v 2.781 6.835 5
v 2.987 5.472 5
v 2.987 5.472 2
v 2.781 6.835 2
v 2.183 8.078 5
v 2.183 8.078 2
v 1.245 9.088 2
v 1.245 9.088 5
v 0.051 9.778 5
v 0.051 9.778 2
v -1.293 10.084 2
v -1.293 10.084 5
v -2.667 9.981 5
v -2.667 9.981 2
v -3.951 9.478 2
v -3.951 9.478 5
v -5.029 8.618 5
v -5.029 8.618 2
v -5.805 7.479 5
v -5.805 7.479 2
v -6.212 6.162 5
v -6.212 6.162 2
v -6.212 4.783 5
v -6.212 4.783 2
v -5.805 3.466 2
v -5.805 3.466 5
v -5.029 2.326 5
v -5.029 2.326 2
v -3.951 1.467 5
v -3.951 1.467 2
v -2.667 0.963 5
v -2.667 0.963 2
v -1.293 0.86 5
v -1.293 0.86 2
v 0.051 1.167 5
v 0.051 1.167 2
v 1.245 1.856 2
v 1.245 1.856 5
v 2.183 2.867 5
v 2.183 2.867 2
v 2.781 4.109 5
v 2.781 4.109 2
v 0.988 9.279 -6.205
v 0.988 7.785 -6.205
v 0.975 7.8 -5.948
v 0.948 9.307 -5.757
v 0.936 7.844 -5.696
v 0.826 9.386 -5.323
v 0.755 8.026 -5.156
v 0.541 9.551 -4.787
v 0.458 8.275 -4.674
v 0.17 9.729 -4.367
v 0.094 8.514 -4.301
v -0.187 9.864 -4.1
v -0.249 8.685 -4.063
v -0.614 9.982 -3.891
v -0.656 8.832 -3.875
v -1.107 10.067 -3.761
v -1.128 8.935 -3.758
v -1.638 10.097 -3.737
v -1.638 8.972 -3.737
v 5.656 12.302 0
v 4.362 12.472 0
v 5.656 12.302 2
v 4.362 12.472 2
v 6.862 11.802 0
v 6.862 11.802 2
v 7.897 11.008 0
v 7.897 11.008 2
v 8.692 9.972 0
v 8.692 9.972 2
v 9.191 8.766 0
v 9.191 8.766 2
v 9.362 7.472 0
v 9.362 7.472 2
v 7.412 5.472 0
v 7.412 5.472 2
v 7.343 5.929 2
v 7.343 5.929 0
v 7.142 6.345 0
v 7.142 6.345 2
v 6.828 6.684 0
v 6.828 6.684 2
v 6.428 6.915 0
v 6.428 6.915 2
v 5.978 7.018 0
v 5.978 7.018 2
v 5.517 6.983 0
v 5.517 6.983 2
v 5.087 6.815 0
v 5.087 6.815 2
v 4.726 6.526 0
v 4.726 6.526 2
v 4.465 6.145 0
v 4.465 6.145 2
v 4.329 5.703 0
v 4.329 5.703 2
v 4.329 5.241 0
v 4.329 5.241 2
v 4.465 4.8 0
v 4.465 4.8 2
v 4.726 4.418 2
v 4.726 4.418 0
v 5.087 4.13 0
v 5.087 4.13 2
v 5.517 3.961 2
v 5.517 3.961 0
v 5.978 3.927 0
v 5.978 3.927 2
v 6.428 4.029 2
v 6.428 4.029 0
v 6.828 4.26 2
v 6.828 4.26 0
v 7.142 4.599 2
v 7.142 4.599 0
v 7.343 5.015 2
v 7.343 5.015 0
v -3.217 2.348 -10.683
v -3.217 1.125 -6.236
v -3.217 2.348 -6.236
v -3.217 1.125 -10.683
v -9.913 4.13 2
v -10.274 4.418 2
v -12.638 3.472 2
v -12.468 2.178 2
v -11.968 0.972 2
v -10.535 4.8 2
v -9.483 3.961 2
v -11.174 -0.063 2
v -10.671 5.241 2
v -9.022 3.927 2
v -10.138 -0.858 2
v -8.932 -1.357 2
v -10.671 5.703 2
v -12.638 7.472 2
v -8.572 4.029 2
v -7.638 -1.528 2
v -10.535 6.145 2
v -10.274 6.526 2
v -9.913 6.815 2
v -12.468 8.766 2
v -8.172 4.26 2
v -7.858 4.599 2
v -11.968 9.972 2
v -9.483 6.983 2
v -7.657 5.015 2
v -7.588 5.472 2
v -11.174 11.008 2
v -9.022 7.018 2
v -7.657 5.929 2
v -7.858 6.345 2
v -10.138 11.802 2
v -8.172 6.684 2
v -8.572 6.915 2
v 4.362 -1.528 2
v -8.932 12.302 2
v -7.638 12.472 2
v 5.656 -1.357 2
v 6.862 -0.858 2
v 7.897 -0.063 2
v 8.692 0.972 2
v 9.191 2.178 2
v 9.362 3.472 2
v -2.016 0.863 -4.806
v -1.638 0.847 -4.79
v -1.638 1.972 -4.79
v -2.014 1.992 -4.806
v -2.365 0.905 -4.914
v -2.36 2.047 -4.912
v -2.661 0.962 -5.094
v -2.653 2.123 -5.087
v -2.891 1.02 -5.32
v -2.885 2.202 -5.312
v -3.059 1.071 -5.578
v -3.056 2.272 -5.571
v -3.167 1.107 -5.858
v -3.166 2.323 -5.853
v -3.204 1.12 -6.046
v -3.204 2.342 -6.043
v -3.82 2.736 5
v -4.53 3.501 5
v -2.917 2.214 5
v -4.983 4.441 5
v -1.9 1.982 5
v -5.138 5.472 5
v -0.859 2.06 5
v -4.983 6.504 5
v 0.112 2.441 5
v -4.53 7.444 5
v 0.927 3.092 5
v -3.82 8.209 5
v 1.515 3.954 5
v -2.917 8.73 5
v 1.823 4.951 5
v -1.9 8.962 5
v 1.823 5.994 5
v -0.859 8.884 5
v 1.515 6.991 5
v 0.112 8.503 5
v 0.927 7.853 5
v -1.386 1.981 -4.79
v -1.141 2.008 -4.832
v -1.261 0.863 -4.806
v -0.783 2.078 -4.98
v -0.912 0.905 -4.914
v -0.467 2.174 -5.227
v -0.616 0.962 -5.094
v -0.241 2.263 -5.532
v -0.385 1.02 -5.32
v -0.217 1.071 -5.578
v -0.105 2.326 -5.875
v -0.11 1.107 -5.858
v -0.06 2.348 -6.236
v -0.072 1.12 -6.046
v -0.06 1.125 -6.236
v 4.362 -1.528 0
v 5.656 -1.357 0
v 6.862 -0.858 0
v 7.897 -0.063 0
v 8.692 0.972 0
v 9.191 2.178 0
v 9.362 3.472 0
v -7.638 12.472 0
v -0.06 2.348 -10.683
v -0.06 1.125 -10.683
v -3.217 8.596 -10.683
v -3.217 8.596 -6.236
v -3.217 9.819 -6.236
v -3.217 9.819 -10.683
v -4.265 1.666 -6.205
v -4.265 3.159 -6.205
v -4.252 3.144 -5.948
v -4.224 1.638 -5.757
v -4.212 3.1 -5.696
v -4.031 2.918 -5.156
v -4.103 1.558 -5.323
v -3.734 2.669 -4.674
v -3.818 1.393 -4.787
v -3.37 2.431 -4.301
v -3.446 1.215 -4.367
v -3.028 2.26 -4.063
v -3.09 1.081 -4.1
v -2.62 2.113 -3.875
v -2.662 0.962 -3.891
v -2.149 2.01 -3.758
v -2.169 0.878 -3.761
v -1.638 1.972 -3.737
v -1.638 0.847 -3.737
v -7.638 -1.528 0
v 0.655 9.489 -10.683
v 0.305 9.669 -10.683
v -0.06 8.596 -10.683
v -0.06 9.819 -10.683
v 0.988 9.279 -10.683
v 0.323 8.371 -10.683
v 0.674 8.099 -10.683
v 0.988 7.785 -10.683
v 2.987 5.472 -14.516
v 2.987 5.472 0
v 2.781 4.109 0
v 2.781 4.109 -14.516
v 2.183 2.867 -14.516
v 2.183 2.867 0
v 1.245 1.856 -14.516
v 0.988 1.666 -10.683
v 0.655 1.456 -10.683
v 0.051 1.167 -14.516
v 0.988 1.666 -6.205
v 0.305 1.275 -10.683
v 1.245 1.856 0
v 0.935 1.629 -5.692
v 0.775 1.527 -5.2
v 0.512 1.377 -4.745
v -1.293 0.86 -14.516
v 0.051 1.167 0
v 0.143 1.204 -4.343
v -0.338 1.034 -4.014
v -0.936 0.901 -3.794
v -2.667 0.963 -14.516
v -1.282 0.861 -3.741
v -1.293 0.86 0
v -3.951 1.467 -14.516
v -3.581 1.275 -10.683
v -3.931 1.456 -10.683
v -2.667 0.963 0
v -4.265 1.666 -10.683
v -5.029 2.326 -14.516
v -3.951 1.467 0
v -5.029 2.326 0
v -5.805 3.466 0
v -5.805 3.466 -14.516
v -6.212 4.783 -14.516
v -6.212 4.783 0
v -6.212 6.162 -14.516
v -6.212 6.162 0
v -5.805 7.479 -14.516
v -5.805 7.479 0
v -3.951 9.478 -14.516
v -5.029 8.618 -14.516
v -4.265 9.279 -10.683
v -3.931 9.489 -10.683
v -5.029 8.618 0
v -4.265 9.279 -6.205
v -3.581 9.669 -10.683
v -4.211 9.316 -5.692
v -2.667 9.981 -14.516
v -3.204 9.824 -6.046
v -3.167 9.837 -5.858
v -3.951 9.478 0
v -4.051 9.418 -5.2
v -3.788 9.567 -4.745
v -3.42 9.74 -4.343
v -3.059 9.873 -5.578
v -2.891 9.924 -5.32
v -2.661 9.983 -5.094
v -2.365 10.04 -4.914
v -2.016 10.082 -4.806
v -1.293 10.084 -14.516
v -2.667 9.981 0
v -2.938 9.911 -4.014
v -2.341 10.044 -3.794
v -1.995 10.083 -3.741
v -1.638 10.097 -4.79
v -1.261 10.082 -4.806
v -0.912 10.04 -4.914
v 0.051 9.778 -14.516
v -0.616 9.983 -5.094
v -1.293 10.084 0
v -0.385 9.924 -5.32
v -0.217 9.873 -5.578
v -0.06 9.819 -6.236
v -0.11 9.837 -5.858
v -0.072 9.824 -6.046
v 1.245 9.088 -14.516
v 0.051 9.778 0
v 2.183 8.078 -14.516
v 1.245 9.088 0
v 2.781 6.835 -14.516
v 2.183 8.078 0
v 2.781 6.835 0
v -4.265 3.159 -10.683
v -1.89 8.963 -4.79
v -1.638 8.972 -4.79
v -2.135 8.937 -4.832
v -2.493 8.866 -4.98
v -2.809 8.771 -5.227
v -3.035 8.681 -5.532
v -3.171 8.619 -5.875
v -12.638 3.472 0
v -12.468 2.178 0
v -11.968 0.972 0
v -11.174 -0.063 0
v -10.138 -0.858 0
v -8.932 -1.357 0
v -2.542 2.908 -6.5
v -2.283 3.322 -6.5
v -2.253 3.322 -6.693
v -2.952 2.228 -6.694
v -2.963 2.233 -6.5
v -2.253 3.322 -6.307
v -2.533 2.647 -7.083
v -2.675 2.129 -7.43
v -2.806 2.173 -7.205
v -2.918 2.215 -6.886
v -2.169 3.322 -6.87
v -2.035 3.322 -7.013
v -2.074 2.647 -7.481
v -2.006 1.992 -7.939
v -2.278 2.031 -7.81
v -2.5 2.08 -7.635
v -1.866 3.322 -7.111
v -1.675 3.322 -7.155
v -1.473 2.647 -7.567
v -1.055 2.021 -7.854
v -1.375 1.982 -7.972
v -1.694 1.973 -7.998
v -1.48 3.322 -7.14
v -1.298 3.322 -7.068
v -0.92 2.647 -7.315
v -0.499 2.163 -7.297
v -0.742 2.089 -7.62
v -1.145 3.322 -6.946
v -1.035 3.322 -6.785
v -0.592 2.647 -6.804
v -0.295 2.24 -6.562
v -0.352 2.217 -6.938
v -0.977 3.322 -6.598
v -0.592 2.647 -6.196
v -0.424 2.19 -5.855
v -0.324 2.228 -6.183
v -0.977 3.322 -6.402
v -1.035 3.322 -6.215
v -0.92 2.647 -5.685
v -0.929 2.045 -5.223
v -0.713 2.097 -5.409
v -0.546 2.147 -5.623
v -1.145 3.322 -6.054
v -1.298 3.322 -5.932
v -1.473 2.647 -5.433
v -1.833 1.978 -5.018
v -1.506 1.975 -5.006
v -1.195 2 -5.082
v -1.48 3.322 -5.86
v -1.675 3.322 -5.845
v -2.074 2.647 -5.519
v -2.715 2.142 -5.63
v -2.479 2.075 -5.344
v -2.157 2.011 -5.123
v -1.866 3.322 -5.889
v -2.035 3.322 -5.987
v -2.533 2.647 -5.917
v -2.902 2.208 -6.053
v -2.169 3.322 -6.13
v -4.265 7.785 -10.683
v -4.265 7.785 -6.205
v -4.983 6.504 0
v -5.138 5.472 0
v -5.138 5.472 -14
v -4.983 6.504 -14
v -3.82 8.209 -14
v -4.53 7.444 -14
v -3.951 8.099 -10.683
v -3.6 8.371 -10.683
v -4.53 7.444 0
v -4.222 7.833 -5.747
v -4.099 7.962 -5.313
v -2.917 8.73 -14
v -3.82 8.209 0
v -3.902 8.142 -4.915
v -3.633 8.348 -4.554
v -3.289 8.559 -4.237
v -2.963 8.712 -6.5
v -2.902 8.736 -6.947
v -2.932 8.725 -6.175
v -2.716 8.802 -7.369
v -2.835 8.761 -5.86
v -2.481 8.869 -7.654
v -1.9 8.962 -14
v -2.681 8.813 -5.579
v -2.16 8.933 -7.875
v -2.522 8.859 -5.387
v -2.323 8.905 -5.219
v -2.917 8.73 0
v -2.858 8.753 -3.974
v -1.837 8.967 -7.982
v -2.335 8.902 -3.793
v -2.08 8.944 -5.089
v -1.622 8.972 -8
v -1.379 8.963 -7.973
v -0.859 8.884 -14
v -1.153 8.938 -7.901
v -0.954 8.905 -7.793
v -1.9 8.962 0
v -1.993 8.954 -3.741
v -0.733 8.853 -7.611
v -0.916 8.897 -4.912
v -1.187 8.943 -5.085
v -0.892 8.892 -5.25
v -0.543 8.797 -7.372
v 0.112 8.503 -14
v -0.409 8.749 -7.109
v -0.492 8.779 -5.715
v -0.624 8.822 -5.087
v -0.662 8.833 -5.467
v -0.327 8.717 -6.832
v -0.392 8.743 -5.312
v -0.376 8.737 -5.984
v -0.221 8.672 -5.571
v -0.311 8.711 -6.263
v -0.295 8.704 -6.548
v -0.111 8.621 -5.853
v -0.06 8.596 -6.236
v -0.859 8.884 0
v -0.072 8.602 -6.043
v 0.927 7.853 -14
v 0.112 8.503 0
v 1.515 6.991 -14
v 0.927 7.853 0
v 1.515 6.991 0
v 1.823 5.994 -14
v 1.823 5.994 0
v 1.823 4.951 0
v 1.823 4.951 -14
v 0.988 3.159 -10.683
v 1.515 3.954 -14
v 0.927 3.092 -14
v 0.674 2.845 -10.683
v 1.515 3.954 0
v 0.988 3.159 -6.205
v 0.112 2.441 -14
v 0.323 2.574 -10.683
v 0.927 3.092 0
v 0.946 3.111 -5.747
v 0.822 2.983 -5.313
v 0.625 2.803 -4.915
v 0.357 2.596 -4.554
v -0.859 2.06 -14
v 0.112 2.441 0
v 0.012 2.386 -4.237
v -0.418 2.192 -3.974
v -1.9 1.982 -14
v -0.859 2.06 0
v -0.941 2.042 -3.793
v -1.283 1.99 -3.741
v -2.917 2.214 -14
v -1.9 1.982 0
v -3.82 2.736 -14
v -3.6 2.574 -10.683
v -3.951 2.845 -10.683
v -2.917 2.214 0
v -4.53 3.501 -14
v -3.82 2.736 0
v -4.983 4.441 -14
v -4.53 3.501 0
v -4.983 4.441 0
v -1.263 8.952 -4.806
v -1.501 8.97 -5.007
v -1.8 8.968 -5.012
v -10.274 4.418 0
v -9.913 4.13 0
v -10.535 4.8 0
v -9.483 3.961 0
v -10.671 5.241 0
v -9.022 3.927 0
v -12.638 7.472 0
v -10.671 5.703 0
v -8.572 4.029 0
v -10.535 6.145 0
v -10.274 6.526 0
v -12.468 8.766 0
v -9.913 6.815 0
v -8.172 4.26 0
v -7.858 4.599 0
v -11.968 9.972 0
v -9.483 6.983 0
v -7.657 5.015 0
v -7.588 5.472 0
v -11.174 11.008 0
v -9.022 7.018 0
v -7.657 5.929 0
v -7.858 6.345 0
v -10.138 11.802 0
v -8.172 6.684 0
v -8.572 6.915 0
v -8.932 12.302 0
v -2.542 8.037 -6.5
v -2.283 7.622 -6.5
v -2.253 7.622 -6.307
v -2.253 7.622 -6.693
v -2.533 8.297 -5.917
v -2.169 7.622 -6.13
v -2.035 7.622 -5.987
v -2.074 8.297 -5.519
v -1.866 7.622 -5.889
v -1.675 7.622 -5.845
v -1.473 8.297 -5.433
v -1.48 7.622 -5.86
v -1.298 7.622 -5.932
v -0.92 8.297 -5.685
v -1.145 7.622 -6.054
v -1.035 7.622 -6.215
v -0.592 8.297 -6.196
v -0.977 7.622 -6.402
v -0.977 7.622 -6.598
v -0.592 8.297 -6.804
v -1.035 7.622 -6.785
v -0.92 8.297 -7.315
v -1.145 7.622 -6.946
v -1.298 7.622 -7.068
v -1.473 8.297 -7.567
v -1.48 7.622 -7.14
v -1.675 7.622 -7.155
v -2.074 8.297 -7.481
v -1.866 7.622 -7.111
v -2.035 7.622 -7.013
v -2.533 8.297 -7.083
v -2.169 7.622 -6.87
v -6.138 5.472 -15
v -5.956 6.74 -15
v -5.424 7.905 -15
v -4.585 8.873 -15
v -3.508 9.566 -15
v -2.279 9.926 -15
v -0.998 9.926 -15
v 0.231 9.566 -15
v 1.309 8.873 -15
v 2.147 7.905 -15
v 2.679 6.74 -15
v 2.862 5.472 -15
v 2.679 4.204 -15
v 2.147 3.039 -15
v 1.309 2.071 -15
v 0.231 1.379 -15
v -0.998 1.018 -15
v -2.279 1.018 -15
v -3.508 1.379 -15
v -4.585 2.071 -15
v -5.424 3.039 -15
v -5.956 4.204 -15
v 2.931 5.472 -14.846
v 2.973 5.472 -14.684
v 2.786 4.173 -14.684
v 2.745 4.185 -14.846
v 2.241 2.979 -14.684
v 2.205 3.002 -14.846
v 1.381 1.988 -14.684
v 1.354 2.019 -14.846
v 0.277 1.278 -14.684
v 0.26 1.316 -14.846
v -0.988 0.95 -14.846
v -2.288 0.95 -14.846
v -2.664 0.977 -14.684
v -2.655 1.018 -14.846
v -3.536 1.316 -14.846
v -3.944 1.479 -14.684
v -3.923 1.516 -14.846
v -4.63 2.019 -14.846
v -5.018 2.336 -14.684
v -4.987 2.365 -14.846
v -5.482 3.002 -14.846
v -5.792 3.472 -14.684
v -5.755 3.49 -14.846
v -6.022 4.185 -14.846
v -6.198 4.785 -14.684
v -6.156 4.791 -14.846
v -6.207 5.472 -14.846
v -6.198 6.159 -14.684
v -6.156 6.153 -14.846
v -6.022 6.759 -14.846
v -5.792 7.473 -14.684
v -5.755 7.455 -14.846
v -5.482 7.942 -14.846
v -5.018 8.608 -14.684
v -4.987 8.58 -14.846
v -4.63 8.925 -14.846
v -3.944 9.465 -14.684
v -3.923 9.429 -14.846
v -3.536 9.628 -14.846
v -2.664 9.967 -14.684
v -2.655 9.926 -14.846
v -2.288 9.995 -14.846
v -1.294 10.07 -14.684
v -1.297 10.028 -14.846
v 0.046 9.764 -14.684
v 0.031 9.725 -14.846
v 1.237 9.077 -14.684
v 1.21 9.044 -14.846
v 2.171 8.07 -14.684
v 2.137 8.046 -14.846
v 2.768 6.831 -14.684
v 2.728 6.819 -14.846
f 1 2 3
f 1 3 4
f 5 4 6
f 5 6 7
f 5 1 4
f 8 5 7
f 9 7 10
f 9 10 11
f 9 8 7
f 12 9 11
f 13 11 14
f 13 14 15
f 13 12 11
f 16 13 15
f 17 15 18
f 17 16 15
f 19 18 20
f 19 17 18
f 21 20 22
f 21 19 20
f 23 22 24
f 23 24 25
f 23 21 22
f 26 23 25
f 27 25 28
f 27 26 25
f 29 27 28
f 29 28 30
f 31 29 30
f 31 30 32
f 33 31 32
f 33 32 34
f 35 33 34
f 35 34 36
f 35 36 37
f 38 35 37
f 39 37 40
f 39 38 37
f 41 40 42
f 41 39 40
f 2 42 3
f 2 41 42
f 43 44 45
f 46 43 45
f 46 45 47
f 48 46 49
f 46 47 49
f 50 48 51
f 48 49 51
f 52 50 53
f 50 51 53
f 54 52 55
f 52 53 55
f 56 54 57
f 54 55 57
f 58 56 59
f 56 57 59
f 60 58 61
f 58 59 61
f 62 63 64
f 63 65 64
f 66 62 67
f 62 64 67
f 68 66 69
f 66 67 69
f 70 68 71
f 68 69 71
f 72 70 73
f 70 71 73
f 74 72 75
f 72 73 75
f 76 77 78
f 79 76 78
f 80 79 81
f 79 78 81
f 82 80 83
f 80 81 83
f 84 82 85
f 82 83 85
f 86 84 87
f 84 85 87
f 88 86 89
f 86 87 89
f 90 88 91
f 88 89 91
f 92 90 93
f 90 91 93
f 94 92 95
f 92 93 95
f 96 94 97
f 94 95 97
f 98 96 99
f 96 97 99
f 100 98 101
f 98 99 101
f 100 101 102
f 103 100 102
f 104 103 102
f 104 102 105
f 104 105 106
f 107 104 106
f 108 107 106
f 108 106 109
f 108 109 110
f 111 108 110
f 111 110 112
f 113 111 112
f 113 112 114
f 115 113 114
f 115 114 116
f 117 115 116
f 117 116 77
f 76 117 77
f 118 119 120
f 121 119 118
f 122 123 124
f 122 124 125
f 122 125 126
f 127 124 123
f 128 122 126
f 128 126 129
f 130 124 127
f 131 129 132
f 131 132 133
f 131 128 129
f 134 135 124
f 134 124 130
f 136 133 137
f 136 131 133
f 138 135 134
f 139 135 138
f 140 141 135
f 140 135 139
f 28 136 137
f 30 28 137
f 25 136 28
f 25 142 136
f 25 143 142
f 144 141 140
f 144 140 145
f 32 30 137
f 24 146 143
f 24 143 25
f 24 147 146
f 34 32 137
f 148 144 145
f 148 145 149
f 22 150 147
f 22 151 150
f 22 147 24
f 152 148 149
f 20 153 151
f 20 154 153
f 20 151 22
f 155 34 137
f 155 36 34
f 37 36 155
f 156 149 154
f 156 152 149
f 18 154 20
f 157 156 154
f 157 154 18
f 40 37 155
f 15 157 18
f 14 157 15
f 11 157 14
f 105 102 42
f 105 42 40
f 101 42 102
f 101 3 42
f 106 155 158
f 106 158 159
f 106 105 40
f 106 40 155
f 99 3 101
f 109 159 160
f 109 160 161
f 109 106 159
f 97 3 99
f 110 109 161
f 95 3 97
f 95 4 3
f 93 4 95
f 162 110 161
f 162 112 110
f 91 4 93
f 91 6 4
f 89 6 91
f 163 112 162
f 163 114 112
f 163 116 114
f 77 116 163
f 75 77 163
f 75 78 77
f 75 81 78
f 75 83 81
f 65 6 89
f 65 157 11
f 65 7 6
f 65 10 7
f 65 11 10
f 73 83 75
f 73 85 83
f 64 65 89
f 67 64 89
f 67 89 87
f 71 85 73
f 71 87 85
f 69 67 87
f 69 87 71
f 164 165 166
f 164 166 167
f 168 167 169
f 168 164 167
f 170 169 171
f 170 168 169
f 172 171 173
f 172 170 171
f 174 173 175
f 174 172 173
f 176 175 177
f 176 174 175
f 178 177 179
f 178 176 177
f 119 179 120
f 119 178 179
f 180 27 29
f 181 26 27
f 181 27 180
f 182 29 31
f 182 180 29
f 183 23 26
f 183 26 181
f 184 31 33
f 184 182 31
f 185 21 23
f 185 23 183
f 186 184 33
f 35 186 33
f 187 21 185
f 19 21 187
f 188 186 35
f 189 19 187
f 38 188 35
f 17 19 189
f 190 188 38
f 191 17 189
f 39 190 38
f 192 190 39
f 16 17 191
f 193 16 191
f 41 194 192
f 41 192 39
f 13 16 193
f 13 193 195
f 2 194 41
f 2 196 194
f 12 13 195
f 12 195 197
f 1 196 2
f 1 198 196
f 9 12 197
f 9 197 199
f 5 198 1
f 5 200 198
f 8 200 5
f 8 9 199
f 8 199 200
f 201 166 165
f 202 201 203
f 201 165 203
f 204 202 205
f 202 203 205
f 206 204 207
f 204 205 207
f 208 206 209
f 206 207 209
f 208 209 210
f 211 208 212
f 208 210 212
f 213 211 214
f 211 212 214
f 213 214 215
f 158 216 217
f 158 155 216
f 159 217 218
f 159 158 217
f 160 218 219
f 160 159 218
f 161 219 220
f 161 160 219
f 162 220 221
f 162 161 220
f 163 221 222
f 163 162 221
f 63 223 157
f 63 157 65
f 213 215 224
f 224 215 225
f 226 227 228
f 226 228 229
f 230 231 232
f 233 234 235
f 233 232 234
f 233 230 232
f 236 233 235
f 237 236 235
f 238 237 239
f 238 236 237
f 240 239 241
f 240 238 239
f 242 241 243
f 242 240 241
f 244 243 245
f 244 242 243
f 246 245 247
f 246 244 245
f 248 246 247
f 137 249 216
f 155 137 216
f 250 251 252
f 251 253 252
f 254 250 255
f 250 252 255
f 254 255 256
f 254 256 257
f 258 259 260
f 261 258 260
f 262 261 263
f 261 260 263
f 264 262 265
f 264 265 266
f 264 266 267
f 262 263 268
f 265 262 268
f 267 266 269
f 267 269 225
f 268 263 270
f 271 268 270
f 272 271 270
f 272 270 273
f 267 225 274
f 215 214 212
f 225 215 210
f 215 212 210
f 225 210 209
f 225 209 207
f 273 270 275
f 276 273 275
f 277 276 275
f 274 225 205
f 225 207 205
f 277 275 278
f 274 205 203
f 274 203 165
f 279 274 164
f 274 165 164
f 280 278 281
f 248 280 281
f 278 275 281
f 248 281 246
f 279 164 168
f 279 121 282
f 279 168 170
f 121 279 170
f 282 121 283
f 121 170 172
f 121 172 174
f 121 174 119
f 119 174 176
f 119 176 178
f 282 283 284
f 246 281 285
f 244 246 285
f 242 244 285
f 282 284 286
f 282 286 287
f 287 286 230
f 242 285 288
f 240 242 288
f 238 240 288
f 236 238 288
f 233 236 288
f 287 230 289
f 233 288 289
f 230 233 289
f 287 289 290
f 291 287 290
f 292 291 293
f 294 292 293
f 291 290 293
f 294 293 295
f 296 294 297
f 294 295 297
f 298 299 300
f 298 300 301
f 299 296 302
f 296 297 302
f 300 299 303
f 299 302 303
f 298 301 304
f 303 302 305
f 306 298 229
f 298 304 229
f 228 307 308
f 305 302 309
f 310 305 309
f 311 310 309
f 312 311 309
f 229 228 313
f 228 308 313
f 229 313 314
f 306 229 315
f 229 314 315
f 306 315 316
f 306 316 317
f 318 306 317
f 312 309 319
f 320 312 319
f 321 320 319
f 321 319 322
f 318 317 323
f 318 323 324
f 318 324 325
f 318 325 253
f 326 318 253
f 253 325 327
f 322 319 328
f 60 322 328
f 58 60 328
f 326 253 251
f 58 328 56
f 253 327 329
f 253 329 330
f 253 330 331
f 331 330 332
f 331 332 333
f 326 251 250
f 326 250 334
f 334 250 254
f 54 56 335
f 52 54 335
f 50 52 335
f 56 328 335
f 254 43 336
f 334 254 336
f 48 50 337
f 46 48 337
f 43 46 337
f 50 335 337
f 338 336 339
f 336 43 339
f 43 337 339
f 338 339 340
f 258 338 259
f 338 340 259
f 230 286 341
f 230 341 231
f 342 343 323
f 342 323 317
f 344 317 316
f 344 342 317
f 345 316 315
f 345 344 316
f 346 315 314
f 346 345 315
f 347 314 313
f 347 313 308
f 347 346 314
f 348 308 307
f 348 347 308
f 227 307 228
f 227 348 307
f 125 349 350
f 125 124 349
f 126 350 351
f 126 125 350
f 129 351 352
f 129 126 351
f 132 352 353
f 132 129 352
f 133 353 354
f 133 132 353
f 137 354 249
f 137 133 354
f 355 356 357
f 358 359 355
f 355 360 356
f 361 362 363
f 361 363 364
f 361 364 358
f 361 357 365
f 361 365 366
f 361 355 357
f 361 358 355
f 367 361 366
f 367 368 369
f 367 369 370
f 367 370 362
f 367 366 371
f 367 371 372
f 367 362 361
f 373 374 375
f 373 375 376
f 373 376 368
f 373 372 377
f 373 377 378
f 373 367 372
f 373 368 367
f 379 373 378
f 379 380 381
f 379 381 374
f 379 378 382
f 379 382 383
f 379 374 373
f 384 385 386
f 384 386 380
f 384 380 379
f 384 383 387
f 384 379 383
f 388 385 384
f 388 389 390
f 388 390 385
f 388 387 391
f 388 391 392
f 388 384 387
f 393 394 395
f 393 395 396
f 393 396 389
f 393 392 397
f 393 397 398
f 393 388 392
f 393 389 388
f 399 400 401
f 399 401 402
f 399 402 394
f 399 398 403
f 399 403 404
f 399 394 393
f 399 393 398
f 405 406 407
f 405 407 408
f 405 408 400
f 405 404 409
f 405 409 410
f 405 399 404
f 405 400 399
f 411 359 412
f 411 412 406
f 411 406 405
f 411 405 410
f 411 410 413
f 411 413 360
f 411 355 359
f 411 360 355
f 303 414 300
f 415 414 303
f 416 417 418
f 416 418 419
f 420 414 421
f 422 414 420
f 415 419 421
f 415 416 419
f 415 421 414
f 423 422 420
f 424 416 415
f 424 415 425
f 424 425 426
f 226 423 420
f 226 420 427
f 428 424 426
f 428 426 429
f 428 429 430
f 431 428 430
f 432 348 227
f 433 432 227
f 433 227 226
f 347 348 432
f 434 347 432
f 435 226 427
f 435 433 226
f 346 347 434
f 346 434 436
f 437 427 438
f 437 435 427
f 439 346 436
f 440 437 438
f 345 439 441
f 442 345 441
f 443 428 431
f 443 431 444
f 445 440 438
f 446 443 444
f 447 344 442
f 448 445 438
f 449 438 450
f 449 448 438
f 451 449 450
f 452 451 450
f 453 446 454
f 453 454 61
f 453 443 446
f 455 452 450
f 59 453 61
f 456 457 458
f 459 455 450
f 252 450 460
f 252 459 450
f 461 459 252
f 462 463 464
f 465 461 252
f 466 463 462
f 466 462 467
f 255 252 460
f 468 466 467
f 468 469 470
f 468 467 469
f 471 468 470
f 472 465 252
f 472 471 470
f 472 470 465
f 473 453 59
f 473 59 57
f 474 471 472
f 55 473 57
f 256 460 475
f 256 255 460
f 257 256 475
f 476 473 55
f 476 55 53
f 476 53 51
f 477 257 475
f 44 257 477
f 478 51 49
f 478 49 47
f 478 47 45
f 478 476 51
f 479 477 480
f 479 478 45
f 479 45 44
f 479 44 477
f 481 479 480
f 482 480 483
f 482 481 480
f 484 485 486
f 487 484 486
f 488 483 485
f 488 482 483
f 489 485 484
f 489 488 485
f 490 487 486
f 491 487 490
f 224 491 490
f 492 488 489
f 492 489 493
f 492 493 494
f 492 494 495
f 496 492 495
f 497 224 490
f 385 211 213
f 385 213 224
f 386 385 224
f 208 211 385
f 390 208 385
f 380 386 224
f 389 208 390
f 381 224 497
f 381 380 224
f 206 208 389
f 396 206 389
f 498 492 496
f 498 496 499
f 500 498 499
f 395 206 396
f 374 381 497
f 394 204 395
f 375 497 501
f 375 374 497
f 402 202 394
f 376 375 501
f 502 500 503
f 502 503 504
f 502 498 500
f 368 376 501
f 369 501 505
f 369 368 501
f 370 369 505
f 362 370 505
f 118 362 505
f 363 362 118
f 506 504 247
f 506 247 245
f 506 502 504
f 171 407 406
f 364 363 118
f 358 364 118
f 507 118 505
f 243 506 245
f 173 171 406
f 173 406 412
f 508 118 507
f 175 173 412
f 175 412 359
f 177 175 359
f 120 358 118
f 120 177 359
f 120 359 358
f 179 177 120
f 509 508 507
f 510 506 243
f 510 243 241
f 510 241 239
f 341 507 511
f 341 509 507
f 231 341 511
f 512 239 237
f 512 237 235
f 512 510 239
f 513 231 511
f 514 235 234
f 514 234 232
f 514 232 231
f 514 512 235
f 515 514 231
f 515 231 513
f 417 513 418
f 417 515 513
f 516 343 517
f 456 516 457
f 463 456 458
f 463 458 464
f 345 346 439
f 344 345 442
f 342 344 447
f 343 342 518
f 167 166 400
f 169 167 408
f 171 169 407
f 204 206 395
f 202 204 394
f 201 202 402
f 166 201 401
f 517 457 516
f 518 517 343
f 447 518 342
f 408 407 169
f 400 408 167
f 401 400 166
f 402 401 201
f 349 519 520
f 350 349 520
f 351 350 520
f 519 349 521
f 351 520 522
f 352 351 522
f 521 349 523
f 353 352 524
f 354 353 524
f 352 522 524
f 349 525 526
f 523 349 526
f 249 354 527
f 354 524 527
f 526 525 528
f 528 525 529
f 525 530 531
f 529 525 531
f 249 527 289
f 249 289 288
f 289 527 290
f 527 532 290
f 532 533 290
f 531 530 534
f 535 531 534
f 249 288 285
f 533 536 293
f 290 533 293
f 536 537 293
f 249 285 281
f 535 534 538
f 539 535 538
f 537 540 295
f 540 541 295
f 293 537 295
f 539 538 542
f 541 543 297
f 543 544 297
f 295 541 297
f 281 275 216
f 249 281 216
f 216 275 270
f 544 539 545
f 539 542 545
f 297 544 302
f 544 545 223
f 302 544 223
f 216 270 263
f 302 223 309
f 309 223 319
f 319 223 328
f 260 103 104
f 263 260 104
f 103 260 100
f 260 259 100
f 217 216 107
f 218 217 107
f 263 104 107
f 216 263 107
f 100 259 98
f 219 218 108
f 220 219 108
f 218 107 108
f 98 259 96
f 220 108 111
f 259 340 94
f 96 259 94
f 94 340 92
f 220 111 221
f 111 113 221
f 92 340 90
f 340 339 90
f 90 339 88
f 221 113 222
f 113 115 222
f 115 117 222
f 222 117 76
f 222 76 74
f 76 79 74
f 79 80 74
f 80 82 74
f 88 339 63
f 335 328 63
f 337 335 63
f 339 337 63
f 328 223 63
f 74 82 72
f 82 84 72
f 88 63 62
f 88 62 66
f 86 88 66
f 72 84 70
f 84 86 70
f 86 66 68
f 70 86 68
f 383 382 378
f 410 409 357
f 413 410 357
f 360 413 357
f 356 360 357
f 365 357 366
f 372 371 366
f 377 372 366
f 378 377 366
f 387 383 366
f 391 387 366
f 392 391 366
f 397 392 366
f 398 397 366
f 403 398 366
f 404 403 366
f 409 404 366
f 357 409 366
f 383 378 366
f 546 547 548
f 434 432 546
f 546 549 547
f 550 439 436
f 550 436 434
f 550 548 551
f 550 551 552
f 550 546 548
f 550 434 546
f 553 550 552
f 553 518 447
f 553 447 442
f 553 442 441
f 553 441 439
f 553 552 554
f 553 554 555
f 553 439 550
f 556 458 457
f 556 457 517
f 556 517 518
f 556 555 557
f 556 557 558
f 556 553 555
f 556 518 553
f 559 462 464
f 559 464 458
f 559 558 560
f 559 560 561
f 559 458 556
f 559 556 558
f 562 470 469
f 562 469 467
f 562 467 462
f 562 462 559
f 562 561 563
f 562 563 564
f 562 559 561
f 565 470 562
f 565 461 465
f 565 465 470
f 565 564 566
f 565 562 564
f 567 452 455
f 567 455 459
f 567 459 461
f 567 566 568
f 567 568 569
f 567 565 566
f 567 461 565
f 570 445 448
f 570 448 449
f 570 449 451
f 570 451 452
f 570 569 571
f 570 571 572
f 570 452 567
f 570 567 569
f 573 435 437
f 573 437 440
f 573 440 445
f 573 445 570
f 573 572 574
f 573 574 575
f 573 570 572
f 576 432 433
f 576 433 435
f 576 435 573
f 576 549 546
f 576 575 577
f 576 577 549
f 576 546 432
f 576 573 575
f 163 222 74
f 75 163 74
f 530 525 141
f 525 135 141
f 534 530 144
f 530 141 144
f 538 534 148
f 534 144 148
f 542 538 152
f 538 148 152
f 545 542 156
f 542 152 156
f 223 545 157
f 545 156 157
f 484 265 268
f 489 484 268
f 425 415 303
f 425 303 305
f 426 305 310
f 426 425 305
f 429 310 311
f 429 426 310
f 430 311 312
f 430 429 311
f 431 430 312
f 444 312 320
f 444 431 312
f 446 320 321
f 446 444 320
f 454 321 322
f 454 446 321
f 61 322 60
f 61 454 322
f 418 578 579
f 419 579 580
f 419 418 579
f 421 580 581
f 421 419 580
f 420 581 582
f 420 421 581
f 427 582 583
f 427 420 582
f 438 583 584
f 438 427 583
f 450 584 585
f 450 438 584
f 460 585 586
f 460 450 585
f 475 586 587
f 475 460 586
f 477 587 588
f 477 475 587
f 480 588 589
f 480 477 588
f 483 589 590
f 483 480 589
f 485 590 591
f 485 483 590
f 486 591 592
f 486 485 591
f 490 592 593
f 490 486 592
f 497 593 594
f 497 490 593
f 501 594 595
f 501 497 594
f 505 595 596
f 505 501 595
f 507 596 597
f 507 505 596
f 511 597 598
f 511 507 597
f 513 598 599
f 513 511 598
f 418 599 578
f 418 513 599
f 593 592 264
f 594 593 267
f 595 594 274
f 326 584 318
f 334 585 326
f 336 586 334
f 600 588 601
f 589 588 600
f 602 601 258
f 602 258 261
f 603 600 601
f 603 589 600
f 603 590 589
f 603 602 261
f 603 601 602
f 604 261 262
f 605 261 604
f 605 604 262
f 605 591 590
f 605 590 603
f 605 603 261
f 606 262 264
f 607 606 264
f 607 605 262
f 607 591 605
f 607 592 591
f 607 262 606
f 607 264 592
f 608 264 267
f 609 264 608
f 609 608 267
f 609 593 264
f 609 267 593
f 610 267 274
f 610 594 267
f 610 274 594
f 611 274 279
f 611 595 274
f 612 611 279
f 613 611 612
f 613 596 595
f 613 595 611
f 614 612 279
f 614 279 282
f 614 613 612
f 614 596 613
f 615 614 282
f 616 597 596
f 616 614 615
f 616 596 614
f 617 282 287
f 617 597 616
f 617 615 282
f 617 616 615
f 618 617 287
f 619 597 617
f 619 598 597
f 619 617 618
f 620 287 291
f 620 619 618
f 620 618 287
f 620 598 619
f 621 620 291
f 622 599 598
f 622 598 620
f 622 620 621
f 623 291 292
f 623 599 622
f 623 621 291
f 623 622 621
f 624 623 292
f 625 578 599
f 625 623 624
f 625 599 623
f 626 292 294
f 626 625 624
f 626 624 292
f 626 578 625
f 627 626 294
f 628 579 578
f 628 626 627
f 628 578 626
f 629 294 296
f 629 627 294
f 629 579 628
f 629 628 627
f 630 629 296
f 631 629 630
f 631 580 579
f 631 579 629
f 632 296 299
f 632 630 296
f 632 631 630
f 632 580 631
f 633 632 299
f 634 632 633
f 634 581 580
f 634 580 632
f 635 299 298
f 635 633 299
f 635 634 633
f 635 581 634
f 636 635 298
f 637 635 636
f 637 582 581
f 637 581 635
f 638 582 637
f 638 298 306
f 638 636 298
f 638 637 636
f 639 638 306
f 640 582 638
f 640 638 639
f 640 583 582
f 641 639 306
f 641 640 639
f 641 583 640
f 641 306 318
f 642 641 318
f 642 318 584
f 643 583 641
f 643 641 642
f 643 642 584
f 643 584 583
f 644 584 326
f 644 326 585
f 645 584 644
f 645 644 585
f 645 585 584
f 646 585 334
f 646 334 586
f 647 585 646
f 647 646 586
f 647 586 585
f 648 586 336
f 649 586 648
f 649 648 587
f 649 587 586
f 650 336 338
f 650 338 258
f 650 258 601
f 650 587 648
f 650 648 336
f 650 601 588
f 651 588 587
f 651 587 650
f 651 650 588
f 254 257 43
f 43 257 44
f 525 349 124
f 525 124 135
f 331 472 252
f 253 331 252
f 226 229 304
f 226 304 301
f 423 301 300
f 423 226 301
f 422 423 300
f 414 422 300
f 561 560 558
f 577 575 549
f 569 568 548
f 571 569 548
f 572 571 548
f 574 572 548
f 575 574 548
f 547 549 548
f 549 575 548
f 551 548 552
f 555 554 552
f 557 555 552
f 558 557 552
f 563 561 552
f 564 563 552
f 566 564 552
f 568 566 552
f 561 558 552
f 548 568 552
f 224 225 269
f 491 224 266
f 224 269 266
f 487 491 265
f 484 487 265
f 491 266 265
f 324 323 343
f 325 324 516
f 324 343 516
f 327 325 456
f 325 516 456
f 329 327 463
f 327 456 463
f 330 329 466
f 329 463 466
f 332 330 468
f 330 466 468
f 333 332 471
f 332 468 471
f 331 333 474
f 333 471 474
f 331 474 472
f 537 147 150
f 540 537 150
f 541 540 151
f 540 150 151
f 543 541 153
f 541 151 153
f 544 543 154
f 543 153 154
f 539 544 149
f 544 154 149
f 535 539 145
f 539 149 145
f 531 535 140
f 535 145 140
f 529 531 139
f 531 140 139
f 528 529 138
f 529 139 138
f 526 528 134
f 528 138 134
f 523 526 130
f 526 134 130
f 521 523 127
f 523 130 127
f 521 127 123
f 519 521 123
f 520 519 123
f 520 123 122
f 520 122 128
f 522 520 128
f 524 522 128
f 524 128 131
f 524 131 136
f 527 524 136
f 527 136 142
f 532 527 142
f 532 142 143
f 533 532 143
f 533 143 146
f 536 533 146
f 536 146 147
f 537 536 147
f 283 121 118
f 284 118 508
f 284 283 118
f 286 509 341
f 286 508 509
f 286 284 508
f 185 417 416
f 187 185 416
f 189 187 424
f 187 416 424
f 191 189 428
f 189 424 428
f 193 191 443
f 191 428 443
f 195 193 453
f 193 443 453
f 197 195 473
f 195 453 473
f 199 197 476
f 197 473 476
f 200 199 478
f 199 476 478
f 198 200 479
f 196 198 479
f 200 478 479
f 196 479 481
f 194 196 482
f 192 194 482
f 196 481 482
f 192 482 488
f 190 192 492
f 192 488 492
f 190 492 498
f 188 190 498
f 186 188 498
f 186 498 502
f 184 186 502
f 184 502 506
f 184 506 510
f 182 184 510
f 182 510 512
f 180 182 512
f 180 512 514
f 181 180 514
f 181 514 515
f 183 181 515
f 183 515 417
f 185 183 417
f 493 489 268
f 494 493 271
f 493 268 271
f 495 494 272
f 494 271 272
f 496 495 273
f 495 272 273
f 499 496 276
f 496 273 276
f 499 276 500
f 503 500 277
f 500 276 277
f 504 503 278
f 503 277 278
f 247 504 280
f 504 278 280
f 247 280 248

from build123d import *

# Parameters (mm, degrees)
ESQUISSE1_W               = 22
ESQUISSE1_H               = 14
BOSS_EXTRU_1_DEPTH        = 2
ESQUISSE3_R               = 4.625
ESQUISSE3_R_2             = 3.5
BOSS_EXTRU_2_DEPTH        = 15
BOSS_EXTRU_3_START        = 3
ESQUISSE5_R               = 4.625
BOSS_EXTRU_3_DEPTH        = 3
ESQUISSE4_R               = 3.5
ENL_V_MAT_EXTRU_1_DEPTH   = 24.243966888
ENL_V_MAT_EXTRU_2_DEPTH   = 21.826081473
CONG_1_R                  = 5
D_GAGEMENT_M2_51_D        = 3.1
D_GAGEMENT_M2_51_DEPTH    = 18.17
D_GAGEMENT_M2_51_TIP      = 0.931333959
CHANFREIN1_SIZE           = 1
CONG_2_R                  = 1
ESQUISSE12_R              = 1.5
BOSS_EXTRU_4_DEPTH        = 1.35
BOSS_EXTRU_4_DRAFT        = -32
SYM_TRIE2_COPY_1_SKETCH_R = 1.5
SYM_TRIE2_COPY_1_DEPTH    = 1.35
SYM_TRIE2_COPY_1_DRAFT    = -32


with BuildPart() as part:
    # Esquisse1 → Boss.-Extru.1 (new body)
    with BuildSketch(Plane.XY):
        with Locations((-1.638262124, 5.472222222)):
            Rectangle(ESQUISSE1_W, ESQUISSE1_H)
    extrude(amount=BOSS_EXTRU_1_DEPTH)

    # Esquisse3 → Boss.-Extru.2 (add)
    with BuildSketch(Plane(origin=(0, 0, 0), x_dir=(-1, 0, 0), z_dir=(0, 0, -1))):
        with Locations(Location((1.638262124, 5.472222222, 0), (0, 0, 180))):
            Circle(ESQUISSE3_R)
        with Locations((1.638262124, 5.472222222)):
            Circle(ESQUISSE3_R_2, mode=Mode.SUBTRACT)
    extrude(amount=BOSS_EXTRU_2_DEPTH)

    # Esquisse5 → Boss.-Extru.3 (add)
    with BuildSketch(Plane.XY.offset(2).offset(BOSS_EXTRU_3_START)):
        with Locations((-1.638262124, 5.472222222)):
            Circle(ESQUISSE5_R)
    extrude(amount=-BOSS_EXTRU_3_DEPTH)

    # Esquisse4 → Enlèv. mat.-Extru.1 (cut, through all)
    with BuildSketch(Plane(origin=(0, 0, 0), x_dir=(-1, 0, 0), z_dir=(0, 0, -1))):
        with Locations((1.638262124, 5.472222222)):
            Circle(ESQUISSE4_R)
    extrude(amount=-ENL_V_MAT_EXTRU_1_DEPTH, mode=Mode.SUBTRACT)

    # Esquisse6 → Enlèv. mat.-Extru.2 (cut, symmetric)
    with BuildSketch(Plane(origin=(0, 5.472222222, 0), x_dir=(-1, 0, 0), z_dir=(0, -1, 0))):
        with BuildLine():
            Line((3.21697524, 10.683041), (4.265016312, 10.683041))
            Line((4.265016312, 10.683041), (4.265016312, 6.204978645))
            ThreePointArc((4.265016312, 6.204978645), (3.485411067, 4.403002531), (1.638262124, 3.737462868))
            Line((1.638262124, 3.737462868), (1.638262124, 4.790102764))
            ThreePointArc((1.638262124, 4.790102764), (2.74581304, 5.165435363), (3.21697524, 6.235738952))
            Line((3.21697524, 6.235738952), (3.21697524, 10.683041))
        make_face()
    enl_v_mat_extru_2 = extrude(amount=ENL_V_MAT_EXTRU_2_DEPTH, both=True, mode=Mode.SUBTRACT)

    # Symétrie1: Enlèv. mat.-Extru.2 across plane
    add(enl_v_mat_extru_2.mirror(Plane.ZY.offset(1.638262124)), mode=Mode.SUBTRACT)

    # Congé1
    cong_1_edges = [part.edges().sort_by_distance(p)[0] for p in [
        (-12.638262124, 12.472222222, 1),
        (9.361737876, 12.472222222, 1),
        (9.361737876, -1.527777778, 1),
        (-12.638262124, -1.527777778, 1),
    ]]
    fillet(cong_1_edges, radius=CONG_1_R)

    # Dégagement M2.51
    with Locations(Plane(origin=(0, 0, 0), x_dir=(-1, 0, 0), z_dir=(0, 0, -1))):
        with Locations((-5.861737876, 5.472222222), (9.138262124, 5.472222222)):
            Hole(D_GAGEMENT_M2_51_D / 2, depth=D_GAGEMENT_M2_51_DEPTH)
            with Locations((0, 0, -(D_GAGEMENT_M2_51_DEPTH + D_GAGEMENT_M2_51_TIP / 2))):  # 118° drill point
                Cone(0, D_GAGEMENT_M2_51_D / 2, D_GAGEMENT_M2_51_TIP, mode=Mode.SUBTRACT)

    # Chanfrein1
    chanfrein1_edges = [part.edges().sort_by_distance(p)[0] for p in [
        (1.861737876, 5.472222222, -15),
    ]]
    chamfer(chanfrein1_edges, length=CHANFREIN1_SIZE)

    # Congé2
    # the kernel refuses this fillet: 1 mm, written as the material it takes off along each edge
    with BuildSketch(Plane(origin=(-1.638262124, 5.472222222, -15), x_dir=(1, 0, 0), z_dir=(0, 1, 0))) as cong_2_piece_1:
        with BuildLine():
            CenterArc((3.625, -0.484122918), CONG_2_R, 0, 28.955024372)
            Line((4.625, -0.484122918), (4.645, -0.484122918))
            Line((4.645, -0.484122918), (4.645, 0))
            Line((4.645, 0), (4.625, 0.02))
            ThreePointArc((4.625, 0.02), (4.5625, 0.02), (4.5175, 0.009682458))
            Line((4.5175, 0.009682458), (4.5, 0))
        make_face()
    revolve(axis=Axis((-1.638262124, 5.472222222, -15), (0, 0, -1)), mode=Mode.SUBTRACT)


with BuildPart() as boss_extru_4_tool:
    # Esquisse12 → Boss.-Extru.4 (with draft: the straight prism first)
    with BuildSketch(Plane(origin=(0, 1.972222222, 0), x_dir=(-1, 0, 0), z_dir=(0, -1, 0))):
        with Locations((1.626150822, 6.5)):
            Circle(ESQUISSE12_R)
    extrude(amount=-BOSS_EXTRU_4_DEPTH)
    # Boss.-Extru.4: the draft: its side faces are tilted about the plane it starts from
    boss_extru_4_sides = [boss_extru_4_tool.faces().sort_by_distance(p)[0] for p in [
        (-0.126150822, 2.647222222, -6.5),
    ]]
    draft(boss_extru_4_sides, Plane(origin=(0, 1.972222222, 0), x_dir=(-1, 0, 0), z_dir=(0, -1, 0)), BOSS_EXTRU_4_DRAFT)


with BuildPart() as part_1:
    add(part.part)

    # Boss.-Extru.4: add boss_extru_4_tool
    add(boss_extru_4_tool.part)


with BuildPart() as sym_trie2_copy_1_tool:
    # Symétrie2 copy 1 sketch → Symétrie2 copy 1 (with draft: the straight prism first)
    with BuildSketch(Plane(origin=(0, 8.972222222, 0), x_dir=(-1, 0, 0), z_dir=(0, 1, 0))):
        with Locations((1.626150822, -6.5)):
            Circle(SYM_TRIE2_COPY_1_SKETCH_R)
    extrude(amount=-SYM_TRIE2_COPY_1_DEPTH)
    # Symétrie2 copy 1: the draft: its side faces are tilted about the plane it starts from
    sym_trie2_copy_1_sides = [sym_trie2_copy_1_tool.faces().sort_by_distance(p)[0] for p in [
        (-0.126150822, 8.297222222, -6.5),
    ]]
    draft(sym_trie2_copy_1_sides, Plane(origin=(0, 8.972222222, 0), x_dir=(-1, 0, 0), z_dir=(0, 1, 0)), SYM_TRIE2_COPY_1_DRAFT)


with BuildPart() as part_2:
    add(part_1.part)

    # Symétrie2 copy 1: add sym_trie2_copy_1_tool
    add(sym_trie2_copy_1_tool.part)


solid = part_2.part
